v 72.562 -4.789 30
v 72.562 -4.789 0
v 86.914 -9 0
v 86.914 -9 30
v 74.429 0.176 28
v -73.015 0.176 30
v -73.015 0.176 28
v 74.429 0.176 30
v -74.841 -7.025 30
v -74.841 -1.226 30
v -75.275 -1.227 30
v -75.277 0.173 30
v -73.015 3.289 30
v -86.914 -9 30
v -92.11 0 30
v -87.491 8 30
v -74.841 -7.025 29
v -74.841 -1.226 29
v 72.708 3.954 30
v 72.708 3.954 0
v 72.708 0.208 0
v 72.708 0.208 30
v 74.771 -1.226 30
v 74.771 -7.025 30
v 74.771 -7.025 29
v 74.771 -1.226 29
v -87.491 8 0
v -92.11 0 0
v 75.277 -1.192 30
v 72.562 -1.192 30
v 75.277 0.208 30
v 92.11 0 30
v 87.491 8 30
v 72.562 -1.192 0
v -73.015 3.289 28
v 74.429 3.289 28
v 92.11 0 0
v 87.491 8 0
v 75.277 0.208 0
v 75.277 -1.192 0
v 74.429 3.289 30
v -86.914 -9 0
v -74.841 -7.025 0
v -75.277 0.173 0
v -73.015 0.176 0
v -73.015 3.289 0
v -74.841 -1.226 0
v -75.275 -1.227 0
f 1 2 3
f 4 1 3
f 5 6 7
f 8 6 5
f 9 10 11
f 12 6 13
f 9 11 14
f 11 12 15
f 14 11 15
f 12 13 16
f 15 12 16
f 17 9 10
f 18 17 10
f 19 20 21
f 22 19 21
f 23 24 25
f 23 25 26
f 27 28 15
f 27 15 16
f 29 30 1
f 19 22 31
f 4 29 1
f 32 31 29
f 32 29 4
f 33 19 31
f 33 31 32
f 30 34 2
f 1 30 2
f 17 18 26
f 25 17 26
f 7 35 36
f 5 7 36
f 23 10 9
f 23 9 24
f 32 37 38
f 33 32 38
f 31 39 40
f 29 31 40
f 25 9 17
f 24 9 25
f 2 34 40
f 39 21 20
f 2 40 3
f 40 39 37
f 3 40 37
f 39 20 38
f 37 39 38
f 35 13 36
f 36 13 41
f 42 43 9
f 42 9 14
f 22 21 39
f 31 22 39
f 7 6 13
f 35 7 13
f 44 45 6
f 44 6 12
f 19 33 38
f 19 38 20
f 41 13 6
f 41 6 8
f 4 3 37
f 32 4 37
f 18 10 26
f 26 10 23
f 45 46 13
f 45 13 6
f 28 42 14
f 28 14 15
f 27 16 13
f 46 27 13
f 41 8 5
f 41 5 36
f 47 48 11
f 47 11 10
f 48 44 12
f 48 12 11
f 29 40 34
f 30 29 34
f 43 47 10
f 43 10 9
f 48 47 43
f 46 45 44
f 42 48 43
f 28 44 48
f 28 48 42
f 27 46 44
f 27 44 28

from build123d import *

# Parameters (mm, degrees)
RESSALTO_EXTRUS_O1_DEPTH   = 30
RESSALTO_EXTRUS_O1_2_DEPTH = 30
ESBO_O2_W                  = 147.444524977
ESBO_O2_H                  = 3.112709989
RESSALTO_EXTRUS_O2_DEPTH   = 2
ESBO_O3_W                  = 149.611840442
ESBO_O3_H                  = 5.798686857
RESSALTO_EXTRUS_O3_DEPTH   = 1


with BuildPart() as part:
    # Esboço1 → Ressalto-extrusão1 (new body)
    with BuildSketch(Plane.XY):
        Polygon((-92.11, 0), (-87.491197846, 8), (-73.015040819, 3.288652645), (-73.015040819, 0.175942656), (-75.277091977, 0.173187386), (-75.275386722, -1.226811575), (-74.840853313, -1.226282296), (-74.840853313, -7.024969153), (-86.913847577, -9), align=None)
    extrude(amount=RESSALTO_EXTRUS_O1_DEPTH)


with BuildPart() as body_2:
    # Esboço1 → Ressalto-extrus_o1 2 (new body)
    with BuildSketch(Plane.XY):
        Polygon((92.11, 0), (87.491197846, 8), (72.7082274, 3.953695686), (72.7082274, 0.208287179), (75.276894, 0.208287179), (75.276894, -1.191712821), (72.562052582, -1.191712821), (72.562052582, -4.789407208), (86.913847577, -9), align=None)
    extrude(amount=RESSALTO_EXTRUS_O1_2_DEPTH)


with BuildPart() as body_3:
    # Esboço2 → Ressalto-extrusão2 (new body)
    with BuildSketch(Plane.XY.offset(30)):
        with Locations((0.70722167, 1.732297651)):
            Rectangle(ESBO_O2_W, ESBO_O2_H)
    extrude(amount=-RESSALTO_EXTRUS_O2_DEPTH)


with BuildPart() as body_4:
    # Esboço3 → Ressalto-extrusão3 (new body)
    with BuildSketch(Plane.XY.offset(30)):
        with Locations((-0.034933092, -4.125625725)):
            Rectangle(ESBO_O3_W, ESBO_O3_H)
    extrude(amount=-RESSALTO_EXTRUS_O3_DEPTH)


solid = Compound([part.part, body_2.part, body_3.part, body_4.part])
